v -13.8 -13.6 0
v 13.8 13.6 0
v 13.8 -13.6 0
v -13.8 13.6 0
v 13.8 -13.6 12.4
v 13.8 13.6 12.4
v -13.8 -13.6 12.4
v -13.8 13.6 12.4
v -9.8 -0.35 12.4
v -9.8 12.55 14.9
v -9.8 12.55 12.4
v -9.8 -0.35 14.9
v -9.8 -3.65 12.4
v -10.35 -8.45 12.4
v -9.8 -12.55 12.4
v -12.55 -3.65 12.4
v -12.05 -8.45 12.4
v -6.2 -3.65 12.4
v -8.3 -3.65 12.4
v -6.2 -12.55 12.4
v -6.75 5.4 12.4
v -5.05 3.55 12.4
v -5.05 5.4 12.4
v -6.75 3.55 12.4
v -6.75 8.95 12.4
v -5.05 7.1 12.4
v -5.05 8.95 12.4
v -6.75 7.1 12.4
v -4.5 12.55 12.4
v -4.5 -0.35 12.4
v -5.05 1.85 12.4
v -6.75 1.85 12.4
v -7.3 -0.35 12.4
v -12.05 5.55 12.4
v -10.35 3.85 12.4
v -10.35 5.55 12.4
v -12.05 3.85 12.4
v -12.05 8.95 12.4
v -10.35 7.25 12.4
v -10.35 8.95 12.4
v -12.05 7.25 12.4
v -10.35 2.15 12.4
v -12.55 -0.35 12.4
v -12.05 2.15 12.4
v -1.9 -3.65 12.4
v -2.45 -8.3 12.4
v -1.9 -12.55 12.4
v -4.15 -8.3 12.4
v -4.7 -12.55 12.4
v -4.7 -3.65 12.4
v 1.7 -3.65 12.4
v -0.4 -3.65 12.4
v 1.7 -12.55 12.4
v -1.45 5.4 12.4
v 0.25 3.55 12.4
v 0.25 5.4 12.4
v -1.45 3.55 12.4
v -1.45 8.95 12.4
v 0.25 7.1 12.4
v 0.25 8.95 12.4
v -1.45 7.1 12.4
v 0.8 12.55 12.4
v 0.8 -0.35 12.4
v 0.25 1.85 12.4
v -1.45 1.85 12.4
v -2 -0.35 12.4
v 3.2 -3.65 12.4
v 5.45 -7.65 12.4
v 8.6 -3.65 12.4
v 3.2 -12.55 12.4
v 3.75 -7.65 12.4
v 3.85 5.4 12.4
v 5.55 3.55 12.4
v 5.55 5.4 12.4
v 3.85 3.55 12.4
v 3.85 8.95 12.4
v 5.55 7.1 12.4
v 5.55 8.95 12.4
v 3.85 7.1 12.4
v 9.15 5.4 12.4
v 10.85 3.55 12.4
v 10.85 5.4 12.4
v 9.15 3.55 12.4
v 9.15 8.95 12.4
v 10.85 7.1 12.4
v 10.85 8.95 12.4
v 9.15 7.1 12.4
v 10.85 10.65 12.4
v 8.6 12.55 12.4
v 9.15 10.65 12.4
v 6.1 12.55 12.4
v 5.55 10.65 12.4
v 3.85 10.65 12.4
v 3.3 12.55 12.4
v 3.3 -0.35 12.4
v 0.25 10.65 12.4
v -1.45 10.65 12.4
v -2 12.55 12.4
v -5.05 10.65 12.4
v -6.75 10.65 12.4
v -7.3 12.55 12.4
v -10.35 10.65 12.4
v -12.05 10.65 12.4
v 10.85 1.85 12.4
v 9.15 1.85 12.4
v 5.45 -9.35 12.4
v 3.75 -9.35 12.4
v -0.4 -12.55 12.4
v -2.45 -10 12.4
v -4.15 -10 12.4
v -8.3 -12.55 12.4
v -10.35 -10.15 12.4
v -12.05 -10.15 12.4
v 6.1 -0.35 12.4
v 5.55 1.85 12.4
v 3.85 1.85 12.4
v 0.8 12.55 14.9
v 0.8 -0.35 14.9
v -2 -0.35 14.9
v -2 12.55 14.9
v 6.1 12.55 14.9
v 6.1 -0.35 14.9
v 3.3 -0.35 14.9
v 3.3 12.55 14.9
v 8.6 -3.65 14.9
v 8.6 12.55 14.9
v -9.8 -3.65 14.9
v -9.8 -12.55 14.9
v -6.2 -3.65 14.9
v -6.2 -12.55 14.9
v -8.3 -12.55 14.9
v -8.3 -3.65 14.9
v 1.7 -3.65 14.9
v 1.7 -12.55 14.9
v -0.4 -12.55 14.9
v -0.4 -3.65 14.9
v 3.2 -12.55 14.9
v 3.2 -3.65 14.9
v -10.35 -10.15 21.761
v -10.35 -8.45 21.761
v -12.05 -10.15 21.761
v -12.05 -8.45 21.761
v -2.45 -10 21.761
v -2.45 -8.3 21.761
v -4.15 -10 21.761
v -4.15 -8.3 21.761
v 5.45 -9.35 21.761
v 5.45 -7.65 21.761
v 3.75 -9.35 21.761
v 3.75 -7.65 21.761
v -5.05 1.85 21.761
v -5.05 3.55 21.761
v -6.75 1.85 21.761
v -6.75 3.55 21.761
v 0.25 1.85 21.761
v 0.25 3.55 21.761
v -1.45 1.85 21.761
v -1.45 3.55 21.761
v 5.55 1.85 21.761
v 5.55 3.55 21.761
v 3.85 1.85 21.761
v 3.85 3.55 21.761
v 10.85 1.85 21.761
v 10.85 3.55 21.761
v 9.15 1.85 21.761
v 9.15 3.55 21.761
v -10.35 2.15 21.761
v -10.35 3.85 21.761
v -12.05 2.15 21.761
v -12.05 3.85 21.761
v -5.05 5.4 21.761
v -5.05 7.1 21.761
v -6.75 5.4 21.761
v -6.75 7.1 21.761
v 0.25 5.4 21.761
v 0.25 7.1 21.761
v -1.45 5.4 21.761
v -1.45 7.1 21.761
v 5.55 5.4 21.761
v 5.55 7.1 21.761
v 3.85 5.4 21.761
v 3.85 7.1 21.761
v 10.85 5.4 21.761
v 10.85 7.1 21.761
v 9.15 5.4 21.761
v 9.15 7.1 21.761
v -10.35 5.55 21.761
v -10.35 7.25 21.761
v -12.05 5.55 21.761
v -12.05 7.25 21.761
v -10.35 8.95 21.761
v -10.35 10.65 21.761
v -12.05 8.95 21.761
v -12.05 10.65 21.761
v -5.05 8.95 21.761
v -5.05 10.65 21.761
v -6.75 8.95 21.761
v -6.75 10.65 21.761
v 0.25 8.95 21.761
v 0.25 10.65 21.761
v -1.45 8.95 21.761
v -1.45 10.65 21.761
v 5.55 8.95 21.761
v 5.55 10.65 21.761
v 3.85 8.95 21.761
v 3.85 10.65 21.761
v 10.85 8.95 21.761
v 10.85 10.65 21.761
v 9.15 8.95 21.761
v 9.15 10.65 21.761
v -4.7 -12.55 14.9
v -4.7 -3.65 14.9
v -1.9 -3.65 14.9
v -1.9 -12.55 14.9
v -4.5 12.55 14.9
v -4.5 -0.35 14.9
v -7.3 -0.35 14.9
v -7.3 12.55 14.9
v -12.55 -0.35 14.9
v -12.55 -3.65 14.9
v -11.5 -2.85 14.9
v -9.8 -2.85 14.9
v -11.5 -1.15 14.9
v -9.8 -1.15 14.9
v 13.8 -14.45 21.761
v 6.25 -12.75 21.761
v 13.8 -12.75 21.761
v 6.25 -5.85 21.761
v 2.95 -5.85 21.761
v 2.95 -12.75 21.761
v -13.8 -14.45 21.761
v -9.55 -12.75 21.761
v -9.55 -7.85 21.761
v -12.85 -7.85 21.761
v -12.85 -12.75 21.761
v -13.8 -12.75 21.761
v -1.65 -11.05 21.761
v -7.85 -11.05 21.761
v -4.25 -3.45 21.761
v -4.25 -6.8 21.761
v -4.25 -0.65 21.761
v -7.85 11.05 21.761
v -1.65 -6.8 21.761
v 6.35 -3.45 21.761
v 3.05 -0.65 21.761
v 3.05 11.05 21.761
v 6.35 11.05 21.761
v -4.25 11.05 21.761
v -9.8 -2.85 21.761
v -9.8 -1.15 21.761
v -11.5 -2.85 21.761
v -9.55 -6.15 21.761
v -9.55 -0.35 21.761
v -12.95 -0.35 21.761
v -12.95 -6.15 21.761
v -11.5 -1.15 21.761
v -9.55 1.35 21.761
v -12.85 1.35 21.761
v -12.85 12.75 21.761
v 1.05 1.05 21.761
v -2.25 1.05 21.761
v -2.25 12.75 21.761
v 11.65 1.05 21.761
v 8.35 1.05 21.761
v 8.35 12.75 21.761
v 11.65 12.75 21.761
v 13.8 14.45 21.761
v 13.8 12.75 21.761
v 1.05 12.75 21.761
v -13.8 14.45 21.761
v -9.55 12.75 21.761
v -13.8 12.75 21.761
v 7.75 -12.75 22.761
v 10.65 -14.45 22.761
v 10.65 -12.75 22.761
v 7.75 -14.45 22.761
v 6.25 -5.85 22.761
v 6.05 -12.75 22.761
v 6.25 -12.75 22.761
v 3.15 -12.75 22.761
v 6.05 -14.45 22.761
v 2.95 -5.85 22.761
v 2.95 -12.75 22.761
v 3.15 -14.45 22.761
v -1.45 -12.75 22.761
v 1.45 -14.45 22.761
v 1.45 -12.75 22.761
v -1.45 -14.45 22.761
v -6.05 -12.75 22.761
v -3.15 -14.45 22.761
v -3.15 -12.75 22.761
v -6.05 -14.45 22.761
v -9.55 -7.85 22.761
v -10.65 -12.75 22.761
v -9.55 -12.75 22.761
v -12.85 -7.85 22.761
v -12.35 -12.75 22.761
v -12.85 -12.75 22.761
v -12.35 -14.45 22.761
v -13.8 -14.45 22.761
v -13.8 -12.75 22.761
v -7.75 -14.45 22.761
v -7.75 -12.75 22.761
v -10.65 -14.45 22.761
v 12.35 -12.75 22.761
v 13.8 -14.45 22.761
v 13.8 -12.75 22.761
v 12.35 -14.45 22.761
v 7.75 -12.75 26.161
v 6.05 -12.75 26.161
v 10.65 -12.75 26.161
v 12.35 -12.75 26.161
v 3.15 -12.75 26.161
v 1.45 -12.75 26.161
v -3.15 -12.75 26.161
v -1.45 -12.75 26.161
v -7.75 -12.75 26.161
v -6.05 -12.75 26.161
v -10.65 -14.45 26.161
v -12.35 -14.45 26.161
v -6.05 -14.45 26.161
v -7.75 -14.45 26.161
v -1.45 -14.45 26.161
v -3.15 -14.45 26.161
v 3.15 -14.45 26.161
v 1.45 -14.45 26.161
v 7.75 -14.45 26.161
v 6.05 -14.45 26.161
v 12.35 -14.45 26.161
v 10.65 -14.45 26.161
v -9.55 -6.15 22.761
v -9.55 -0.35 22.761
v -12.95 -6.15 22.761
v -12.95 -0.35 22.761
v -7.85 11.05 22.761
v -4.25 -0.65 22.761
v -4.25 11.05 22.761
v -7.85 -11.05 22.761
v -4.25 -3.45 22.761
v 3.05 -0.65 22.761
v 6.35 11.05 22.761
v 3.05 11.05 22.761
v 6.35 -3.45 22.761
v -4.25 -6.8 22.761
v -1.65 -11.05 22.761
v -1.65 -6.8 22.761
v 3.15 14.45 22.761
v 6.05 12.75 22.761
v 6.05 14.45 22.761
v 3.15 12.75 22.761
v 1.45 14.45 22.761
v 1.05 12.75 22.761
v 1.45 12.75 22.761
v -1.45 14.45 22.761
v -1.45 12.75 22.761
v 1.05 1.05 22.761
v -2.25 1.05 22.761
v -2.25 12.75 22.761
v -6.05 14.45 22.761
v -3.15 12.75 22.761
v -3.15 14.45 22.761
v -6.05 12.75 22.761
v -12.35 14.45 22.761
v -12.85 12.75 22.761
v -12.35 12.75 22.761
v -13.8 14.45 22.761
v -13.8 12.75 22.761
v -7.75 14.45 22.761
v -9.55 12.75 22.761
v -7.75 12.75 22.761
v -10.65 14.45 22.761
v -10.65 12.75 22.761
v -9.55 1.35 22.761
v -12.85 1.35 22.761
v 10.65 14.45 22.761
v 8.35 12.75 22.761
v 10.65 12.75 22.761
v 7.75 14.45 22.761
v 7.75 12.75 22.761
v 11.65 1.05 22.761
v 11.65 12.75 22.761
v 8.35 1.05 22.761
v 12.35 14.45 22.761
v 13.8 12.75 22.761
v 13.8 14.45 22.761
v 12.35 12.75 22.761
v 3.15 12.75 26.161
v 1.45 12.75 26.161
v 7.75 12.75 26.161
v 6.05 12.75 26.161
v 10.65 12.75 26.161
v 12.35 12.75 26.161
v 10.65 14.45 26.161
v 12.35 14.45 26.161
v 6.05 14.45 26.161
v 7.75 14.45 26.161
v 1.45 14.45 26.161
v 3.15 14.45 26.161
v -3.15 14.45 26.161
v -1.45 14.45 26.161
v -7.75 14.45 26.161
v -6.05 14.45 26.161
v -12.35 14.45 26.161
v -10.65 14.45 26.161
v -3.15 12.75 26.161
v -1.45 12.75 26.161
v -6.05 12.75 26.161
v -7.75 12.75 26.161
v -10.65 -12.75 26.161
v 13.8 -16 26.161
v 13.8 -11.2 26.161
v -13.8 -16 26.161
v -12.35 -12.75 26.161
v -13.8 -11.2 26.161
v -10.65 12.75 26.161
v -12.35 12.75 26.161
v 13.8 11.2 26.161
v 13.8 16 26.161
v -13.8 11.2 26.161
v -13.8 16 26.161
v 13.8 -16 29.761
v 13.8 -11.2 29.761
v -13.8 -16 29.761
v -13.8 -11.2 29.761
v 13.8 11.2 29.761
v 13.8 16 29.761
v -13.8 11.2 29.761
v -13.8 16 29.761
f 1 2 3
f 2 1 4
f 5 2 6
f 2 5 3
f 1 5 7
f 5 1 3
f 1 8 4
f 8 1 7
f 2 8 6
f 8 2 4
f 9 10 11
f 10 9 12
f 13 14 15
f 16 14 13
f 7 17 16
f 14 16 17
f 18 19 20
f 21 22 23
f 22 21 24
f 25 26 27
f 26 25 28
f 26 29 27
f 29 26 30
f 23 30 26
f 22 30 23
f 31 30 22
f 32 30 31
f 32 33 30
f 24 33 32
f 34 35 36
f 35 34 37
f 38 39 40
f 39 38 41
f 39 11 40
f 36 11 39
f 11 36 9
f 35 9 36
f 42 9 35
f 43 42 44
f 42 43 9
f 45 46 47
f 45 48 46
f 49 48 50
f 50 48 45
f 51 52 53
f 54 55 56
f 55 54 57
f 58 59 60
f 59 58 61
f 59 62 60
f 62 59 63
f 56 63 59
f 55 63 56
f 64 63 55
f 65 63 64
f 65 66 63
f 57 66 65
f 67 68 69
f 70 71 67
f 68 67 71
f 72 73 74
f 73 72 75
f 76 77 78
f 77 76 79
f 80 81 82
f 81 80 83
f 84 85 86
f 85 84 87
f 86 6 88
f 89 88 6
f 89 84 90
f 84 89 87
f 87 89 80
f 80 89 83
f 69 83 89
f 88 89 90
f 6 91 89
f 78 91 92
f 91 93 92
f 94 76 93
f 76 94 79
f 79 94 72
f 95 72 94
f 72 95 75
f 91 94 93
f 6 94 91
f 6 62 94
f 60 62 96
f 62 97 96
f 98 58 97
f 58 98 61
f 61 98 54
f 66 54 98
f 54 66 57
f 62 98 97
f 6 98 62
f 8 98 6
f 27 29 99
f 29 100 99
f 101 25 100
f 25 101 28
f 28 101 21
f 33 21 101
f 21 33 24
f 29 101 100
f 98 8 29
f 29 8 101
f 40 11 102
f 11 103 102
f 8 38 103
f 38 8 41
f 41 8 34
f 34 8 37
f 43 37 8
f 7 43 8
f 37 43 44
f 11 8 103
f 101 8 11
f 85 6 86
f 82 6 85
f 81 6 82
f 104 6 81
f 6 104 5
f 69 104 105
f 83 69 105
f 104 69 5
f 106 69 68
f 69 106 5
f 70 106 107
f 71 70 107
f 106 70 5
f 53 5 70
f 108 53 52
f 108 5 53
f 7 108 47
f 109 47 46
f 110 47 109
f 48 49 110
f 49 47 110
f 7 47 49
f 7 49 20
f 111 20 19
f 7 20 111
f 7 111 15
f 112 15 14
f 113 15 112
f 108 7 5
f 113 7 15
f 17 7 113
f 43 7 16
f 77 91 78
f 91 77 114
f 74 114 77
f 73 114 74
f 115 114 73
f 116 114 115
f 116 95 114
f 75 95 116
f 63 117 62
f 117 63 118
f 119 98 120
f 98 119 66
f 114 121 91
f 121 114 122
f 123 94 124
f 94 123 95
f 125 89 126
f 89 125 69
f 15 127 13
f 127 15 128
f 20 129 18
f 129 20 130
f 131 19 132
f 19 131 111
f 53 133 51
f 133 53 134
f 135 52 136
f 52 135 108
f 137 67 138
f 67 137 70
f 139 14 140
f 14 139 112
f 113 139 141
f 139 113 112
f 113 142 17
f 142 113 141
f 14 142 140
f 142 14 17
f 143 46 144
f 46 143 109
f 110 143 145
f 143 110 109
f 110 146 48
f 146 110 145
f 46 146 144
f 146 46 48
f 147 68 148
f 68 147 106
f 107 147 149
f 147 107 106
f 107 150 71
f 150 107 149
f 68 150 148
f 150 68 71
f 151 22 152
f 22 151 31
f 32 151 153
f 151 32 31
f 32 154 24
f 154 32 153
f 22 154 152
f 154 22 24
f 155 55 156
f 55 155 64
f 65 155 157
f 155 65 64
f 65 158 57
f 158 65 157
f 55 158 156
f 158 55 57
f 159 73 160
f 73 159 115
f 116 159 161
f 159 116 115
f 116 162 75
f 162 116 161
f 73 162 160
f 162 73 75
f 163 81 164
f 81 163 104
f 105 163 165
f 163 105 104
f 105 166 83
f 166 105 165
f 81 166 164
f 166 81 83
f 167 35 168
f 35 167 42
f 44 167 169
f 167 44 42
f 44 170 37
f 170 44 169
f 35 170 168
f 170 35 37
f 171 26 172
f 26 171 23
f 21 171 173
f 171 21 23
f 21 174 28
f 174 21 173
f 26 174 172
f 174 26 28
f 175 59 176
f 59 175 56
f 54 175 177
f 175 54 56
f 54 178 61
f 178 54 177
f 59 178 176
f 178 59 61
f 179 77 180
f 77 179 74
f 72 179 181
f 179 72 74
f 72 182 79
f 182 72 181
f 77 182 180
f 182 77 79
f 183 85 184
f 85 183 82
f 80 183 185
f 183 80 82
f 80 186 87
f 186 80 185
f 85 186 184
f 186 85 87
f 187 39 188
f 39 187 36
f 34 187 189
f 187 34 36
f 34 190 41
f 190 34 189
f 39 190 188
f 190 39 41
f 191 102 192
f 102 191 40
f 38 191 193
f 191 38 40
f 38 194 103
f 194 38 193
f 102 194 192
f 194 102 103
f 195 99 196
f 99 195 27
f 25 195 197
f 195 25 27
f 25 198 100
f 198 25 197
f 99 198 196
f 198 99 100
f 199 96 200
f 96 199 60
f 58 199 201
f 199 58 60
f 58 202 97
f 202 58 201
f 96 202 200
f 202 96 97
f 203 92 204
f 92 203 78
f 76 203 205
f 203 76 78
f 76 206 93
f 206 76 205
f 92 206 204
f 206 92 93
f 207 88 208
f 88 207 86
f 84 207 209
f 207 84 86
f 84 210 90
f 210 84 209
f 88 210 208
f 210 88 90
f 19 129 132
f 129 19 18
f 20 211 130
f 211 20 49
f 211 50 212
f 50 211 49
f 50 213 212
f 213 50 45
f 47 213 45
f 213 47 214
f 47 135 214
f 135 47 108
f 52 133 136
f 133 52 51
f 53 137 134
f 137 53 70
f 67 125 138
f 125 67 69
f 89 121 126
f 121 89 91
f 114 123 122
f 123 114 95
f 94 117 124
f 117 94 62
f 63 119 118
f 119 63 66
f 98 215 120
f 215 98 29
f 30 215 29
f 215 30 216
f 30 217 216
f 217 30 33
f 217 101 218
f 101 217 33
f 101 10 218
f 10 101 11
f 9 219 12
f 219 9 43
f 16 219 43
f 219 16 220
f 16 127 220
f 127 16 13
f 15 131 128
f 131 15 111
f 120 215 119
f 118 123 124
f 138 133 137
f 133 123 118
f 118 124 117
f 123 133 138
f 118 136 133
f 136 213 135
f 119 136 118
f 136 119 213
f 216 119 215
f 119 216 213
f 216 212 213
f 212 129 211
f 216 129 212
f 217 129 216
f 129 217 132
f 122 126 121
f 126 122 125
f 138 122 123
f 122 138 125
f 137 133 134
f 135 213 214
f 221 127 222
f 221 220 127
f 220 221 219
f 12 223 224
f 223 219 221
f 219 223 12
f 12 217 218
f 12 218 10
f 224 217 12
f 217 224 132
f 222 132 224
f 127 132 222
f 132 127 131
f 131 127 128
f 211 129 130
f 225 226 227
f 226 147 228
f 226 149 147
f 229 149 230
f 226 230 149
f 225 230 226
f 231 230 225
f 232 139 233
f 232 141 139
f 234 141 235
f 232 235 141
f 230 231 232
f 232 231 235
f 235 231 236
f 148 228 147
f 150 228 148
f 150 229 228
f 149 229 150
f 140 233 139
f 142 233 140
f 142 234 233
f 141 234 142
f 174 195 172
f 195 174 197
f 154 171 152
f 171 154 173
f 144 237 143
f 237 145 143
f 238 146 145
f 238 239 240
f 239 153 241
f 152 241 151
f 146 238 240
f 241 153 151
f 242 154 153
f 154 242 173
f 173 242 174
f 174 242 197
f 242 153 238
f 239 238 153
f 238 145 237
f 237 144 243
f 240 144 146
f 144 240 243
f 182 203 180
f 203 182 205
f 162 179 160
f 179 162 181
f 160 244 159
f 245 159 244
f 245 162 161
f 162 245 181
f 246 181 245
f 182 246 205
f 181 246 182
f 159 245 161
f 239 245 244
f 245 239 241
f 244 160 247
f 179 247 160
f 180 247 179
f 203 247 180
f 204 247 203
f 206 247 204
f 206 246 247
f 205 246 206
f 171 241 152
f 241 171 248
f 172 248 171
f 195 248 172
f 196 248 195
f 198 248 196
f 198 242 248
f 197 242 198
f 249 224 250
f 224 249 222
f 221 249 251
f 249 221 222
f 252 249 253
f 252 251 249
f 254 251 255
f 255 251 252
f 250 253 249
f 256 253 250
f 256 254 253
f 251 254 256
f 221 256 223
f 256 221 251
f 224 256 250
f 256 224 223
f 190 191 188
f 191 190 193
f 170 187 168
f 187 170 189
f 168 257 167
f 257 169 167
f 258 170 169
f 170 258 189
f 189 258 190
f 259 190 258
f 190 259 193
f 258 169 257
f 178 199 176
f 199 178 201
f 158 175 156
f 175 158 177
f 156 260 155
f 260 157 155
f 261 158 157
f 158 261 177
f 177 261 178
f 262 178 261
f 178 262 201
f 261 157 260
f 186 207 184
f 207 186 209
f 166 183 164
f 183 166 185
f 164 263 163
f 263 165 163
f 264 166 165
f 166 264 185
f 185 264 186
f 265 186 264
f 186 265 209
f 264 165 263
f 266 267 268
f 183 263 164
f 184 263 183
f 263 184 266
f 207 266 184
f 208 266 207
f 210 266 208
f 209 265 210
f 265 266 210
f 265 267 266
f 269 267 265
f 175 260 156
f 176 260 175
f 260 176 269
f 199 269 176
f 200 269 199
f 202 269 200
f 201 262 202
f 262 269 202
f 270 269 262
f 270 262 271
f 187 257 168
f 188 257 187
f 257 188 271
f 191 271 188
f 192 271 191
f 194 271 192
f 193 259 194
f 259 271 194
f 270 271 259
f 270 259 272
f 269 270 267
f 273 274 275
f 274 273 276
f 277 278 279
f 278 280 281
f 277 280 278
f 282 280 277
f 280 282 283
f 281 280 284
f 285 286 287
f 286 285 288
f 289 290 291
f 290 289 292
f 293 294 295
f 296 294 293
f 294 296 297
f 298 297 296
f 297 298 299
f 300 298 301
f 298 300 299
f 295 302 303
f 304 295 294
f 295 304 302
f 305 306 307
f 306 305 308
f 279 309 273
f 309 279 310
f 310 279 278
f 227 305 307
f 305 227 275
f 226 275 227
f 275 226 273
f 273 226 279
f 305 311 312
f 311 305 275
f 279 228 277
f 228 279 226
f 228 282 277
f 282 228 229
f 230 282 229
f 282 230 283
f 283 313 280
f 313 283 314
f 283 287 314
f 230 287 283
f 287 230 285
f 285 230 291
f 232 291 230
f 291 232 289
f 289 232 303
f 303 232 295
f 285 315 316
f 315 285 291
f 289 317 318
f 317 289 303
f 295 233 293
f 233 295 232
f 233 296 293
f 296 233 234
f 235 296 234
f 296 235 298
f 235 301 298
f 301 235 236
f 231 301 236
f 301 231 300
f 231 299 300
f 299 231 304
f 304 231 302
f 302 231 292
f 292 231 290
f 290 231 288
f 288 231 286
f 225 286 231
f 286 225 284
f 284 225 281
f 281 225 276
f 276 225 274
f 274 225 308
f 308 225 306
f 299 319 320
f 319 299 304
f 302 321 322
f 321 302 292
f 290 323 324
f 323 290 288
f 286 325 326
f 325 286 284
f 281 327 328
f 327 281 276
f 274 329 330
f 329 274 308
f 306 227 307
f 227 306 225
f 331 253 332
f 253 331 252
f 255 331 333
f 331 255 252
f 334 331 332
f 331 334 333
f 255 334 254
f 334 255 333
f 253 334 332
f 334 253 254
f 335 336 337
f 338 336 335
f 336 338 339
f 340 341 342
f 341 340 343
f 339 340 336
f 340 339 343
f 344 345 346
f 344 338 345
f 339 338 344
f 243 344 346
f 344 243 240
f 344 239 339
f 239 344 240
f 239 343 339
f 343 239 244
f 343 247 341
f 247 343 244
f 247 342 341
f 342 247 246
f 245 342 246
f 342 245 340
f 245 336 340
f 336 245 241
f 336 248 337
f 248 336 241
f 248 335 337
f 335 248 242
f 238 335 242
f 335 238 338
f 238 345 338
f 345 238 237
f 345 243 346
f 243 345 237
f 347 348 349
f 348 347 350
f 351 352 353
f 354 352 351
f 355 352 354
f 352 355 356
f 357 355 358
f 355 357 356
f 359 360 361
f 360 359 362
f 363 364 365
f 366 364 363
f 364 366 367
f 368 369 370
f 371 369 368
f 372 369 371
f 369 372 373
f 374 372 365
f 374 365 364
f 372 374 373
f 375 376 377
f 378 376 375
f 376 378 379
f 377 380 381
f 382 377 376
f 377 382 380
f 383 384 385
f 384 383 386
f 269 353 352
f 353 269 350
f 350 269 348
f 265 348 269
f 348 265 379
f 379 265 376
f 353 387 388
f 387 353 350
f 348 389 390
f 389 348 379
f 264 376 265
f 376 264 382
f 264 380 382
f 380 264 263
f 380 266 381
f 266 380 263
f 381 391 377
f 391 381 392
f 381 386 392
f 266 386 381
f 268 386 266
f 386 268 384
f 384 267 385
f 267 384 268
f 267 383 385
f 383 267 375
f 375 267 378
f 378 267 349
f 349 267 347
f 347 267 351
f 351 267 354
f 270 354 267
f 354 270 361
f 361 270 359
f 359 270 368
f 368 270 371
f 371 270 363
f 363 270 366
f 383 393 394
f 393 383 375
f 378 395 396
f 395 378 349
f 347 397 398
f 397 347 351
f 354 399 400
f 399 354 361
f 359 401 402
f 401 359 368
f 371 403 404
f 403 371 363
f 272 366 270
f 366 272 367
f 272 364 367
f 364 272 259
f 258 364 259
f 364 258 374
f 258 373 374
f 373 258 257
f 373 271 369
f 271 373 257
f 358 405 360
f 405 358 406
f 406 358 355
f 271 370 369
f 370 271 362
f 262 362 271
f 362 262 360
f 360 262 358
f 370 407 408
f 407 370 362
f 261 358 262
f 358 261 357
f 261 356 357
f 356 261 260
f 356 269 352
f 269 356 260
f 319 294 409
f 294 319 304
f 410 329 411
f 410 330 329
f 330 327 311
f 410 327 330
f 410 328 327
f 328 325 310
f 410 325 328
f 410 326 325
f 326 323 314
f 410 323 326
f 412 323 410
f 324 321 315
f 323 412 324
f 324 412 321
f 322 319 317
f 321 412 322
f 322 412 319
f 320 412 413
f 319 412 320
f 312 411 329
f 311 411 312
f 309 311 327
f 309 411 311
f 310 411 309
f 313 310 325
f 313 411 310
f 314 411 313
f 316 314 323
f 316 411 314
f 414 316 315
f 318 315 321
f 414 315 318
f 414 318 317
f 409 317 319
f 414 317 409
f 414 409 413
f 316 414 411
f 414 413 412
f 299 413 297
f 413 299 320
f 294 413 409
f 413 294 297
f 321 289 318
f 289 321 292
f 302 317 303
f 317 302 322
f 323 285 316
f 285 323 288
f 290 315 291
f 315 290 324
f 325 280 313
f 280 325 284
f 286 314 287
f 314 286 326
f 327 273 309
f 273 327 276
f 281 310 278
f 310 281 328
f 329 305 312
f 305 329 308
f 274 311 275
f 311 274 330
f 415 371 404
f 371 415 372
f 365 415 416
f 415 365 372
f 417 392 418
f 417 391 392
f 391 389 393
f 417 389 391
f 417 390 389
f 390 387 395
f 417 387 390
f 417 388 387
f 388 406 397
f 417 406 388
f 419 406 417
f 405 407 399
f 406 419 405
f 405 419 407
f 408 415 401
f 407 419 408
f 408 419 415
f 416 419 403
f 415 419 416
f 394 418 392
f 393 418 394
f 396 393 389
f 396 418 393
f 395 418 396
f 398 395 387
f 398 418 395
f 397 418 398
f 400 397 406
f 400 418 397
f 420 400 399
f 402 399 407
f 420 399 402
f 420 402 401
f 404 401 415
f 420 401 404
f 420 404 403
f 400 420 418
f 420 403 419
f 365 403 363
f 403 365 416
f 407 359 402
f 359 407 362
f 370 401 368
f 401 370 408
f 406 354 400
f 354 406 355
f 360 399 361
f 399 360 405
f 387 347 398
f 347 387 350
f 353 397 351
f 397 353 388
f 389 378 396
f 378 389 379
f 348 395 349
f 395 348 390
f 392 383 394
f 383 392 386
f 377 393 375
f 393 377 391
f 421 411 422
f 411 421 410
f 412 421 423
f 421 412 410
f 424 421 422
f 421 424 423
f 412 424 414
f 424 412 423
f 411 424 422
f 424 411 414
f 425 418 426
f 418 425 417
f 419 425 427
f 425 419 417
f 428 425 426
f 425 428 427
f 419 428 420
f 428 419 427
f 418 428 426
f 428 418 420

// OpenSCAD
// Generated by SolidPython 0.4.2 on 2020-09-29 23:20:22
//!OpenSCAD

scale(v = 0.0100000000) {
	translate(v = [-1380, -1360, 0]) {
		union() {
			color(c = [0.4000000000, 0.4000000000, 0.4000000000]) {
				translate(v = [0, 0, 0]) {
					linear_extrude(height = 1000.0000000000) {
						polygon(paths = [[0, 1, 2, 3]], points = [[0, 0], [0, 2720], [2760, 2720], [2760, 0]]);
					}
				}
			}
			color(c = [0.2000000000, 0.6000000000, 0.2000000000]) {
				translate(v = [0, 0, 1000.0000000000]) {
					linear_extrude(height = 120.0000000000) {
						polygon(paths = [[0, 1, 2, 3]], points = [[0, 1305], [0, 2720], [2760, 2720], [2760, 1305]]);
					}
				}
			}
			color(c = [0.4000000000, 0.4000000000, 0.4000000000]) {
				translate(v = [0, 0, 1000.0000000000]) {
					linear_extrude(height = 120.0000000000) {
						polygon(paths = [[0, 1, 2, 3]], points = [[0, 0], [0, 1305], [2760, 1305], [2760, 0]]);
					}
				}
			}
			color(c = [0.9000000000, 0.6000000000, 0.6000000000]) {
				translate(v = [0, 0, 1120.0000000000]) {
					linear_extrude(height = 120.0000000000) {
						polygon(paths = [[0, 1, 2, 3]], points = [[135, 1485], [135, 2485], [400, 2485], [400, 1485]]);
					}
				}
			}
			color(c = [0.9000000000, 0.6000000000, 0.6000000000]) {
				translate(v = [0, 0, 1120.0000000000]) {
					linear_extrude(height = 120.0000000000) {
						polygon(paths = [[0, 1, 2, 3]], points = [[650, 1485], [650, 2485], [930, 2485], [930, 1485]]);
					}
				}
			}
			color(c = [0.9000000000, 0.6000000000, 0.6000000000]) {
				translate(v = [0, 0, 1120.0000000000]) {
					linear_extrude(height = 120.0000000000) {
						polygon(paths = [[0, 1, 2, 3]], points = [[1180, 1485], [1180, 2485], [1460, 2485], [1460, 1485]]);
					}
				}
			}
			color(c = [0.9000000000, 0.6000000000, 0.6000000000]) {
				translate(v = [0, 0, 1120.0000000000]) {
					linear_extrude(height = 120.0000000000) {
						polygon(paths = [[0, 1, 2, 3]], points = [[1710, 1485], [1710, 2485], [1990, 2485], [1990, 1485]]);
					}
				}
			}
			color(c = [0.9000000000, 0.6000000000, 0.6000000000]) {
				translate(v = [0, 0, 1120.0000000000]) {
					linear_extrude(height = 120.0000000000) {
						polygon(paths = [[0, 1, 2, 3]], points = [[2240, 1485], [2240, 2485], [2505, 2485], [2505, 1485]]);
					}
				}
			}
			color(c = [0.9000000000, 0.6000000000, 0.9000000000]) {
				translate(v = [0, 0, 1120.0000000000]) {
					linear_extrude(height = 120.0000000000) {
						polygon(paths = [[0, 1, 2, 3]], points = [[135, 235], [135, 785], [400, 785], [400, 235]]);
					}
				}
			}
			color(c = [0.9000000000, 0.6000000000, 0.9000000000]) {
				translate(v = [0, 0, 1120.0000000000]) {
					linear_extrude(height = 120.0000000000) {
						polygon(paths = [[0, 1, 2, 3]], points = [[550, 235], [550, 785], [760, 785], [760, 235]]);
					}
				}
			}
			color(c = [0.9000000000, 0.6000000000, 0.9000000000]) {
				translate(v = [0, 0, 1120.0000000000]) {
					linear_extrude(height = 120.0000000000) {
						polygon(paths = [[0, 1, 2, 3]], points = [[910, 235], [910, 785], [1190, 785], [1190, 235]]);
					}
				}
			}
			color(c = [0.9000000000, 0.6000000000, 0.9000000000]) {
				translate(v = [0, 0, 1120.0000000000]) {
					linear_extrude(height = 120.0000000000) {
						polygon(paths = [[0, 1, 2, 3]], points = [[1340, 235], [1340, 785], [1550, 785], [1550, 235]]);
					}
				}
			}
			color(c = [0.9000000000, 0.6000000000, 0.9000000000]) {
				translate(v = [0, 0, 1120.0000000000]) {
					linear_extrude(height = 120.0000000000) {
						polygon(paths = [[0, 1, 2, 3]], points = [[1700, 235], [1700, 785], [1965, 785], [1965, 235]]);
					}
				}
			}
			color(c = [0.2000000000, 0.6000000000, 0.2000000000]) {
				translate(v = [0, 0, 1120.0000000000]) {
					linear_extrude(height = 120.0000000000) {
						difference() {
							polygon(paths = [[0, 1, 2, 3]], points = [[0, 1305], [0, 2720], [2760, 2720], [2760, 1305]]);
							polygon(paths = [[0, 1, 2, 3]], points = [[135, 1485], [400, 1485], [400, 2485], [135, 2485]]);
							polygon(paths = [[0, 1, 2, 3]], points = [[650, 1485], [930, 1485], [930, 2485], [650, 2485]]);
							polygon(paths = [[0, 1, 2, 3]], points = [[1180, 1485], [1460, 1485], [1460, 2485], [1180, 2485]]);
							polygon(paths = [[0, 1, 2, 3]], points = [[1710, 1485], [1990, 1485], [1990, 2485], [1710, 2485]]);
							polygon(paths = [[0, 1, 2, 3]], points = [[2240, 1485], [2505, 1485], [2505, 2485], [2240, 2485]]);
						}
					}
				}
			}
			color(c = [0.4000000000, 0.4000000000, 0.4000000000]) {
				translate(v = [0, 0, 1120.0000000000]) {
					linear_extrude(height = 120.0000000000) {
						difference() {
							polygon(paths = [[0, 1, 2, 3]], points = [[0, 0], [0, 1305], [2760, 1305], [2760, 0]]);
							polygon(paths = [[0, 1, 2, 3]], points = [[135, 235], [400, 235], [400, 785], [135, 785]]);
							polygon(paths = [[0, 1, 2, 3]], points = [[550, 235], [760, 235], [760, 785], [550, 785]]);
							polygon(paths = [[0, 1, 2, 3]], points = [[910, 235], [1190, 235], [1190, 785], [910, 785]]);
							polygon(paths = [[0, 1, 2, 3]], points = [[1340, 235], [1550, 235], [1550, 785], [1340, 785]]);
							polygon(paths = [[0, 1, 2, 3]], points = [[1700, 235], [1965, 235], [1965, 785], [1700, 785]]);
						}
					}
				}
			}
			color(c = [0.1000000000, 0.1000000000, 0.1000000000]) {
				translate(v = [0, 0, 1240.0000000000]) {
					linear_extrude(height = 70.0000000000) {
						polygon(paths = [[0, 1, 2, 3]], points = [[175, 345], [175, 515], [345, 515], [345, 345]]);
					}
				}
			}
			color(c = [0.1000000000, 0.1000000000, 0.1000000000]) {
				translate(v = [0, 0, 1240.0000000000]) {
					linear_extrude(height = 70.0000000000) {
						polygon(paths = [[0, 1, 2, 3]], points = [[965, 360], [965, 530], [1135, 530], [1135, 360]]);
					}
				}
			}
			color(c = [0.1000000000, 0.1000000000, 0.1000000000]) {
				translate(v = [0, 0, 1240.0000000000]) {
					linear_extrude(height = 70.0000000000) {
						polygon(paths = [[0, 1, 2, 3]], points = [[1755, 425], [1755, 595], [1925, 595], [1925, 425]]);
					}
				}
			}
			color(c = [0.1000000000, 0.1000000000, 0.1000000000]) {
				translate(v = [0, 0, 1240.0000000000]) {
					linear_extrude(height = 70.0000000000) {
						polygon(paths = [[0, 1, 2, 3]], points = [[705, 1545], [705, 1715], [875, 1715], [875, 1545]]);
					}
				}
			}
			color(c = [0.1000000000, 0.1000000000, 0.1000000000]) {
				translate(v = [0, 0, 1240.0000000000]) {
					linear_extrude(height = 70.0000000000) {
						polygon(paths = [[0, 1, 2, 3]], points = [[1235, 1545], [1235, 1715], [1405, 1715], [1405, 1545]]);
					}
				}
			}
			color(c = [0.1000000000, 0.1000000000, 0.1000000000]) {
				translate(v = [0, 0, 1240.0000000000]) {
					linear_extrude(height = 70.0000000000) {
						polygon(paths = [[0, 1, 2, 3]], points = [[1765, 1545], [1765, 1715], [1935, 1715], [1935, 1545]]);
					}
				}
			}
			color(c = [0.1000000000, 0.1000000000, 0.1000000000]) {
				translate(v = [0, 0, 1240.0000000000]) {
					linear_extrude(height = 70.0000000000) {
						polygon(paths = [[0, 1, 2, 3]], points = [[2295, 1545], [2295, 1715], [2465, 1715], [2465, 1545]]);
					}
				}
			}
			color(c = [0.1000000000, 0.1000000000, 0.1000000000]) {
				translate(v = [0, 0, 1240.0000000000]) {
					linear_extrude(height = 70.0000000000) {
						polygon(paths = [[0, 1, 2, 3]], points = [[175, 1575], [175, 1745], [345, 1745], [345, 1575]]);
					}
				}
			}
			color(c = [0.1000000000, 0.1000000000, 0.1000000000]) {
				translate(v = [0, 0, 1240.0000000000]) {
					linear_extrude(height = 70.0000000000) {
						polygon(paths = [[0, 1, 2, 3]], points = [[705, 1900], [705, 2070], [875, 2070], [875, 1900]]);
					}
				}
			}
			color(c = [0.1000000000, 0.1000000000, 0.1000000000]) {
				translate(v = [0, 0, 1240.0000000000]) {
					linear_extrude(height = 70.0000000000) {
						polygon(paths = [[0, 1, 2, 3]], points = [[1235, 1900], [1235, 2070], [1405, 2070], [1405, 1900]]);
					}
				}
			}
			color(c = [0.1000000000, 0.1000000000, 0.1000000000]) {
				translate(v = [0, 0, 1240.0000000000]) {
					linear_extrude(height = 70.0000000000) {
						polygon(paths = [[0, 1, 2, 3]], points = [[1765, 1900], [1765, 2070], [1935, 2070], [1935, 1900]]);
					}
				}
			}
			color(c = [0.1000000000, 0.1000000000, 0.1000000000]) {
				translate(v = [0, 0, 1240.0000000000]) {
					linear_extrude(height = 70.0000000000) {
						polygon(paths = [[0, 1, 2, 3]], points = [[2295, 1900], [2295, 2070], [2465, 2070], [2465, 1900]]);
					}
				}
			}
			color(c = [0.1000000000, 0.1000000000, 0.1000000000]) {
				translate(v = [0, 0, 1240.0000000000]) {
					linear_extrude(height = 70.0000000000) {
						polygon(paths = [[0, 1, 2, 3]], points = [[175, 1915], [175, 2085], [345, 2085], [345, 1915]]);
					}
				}
			}
			color(c = [0.1000000000, 0.1000000000, 0.1000000000]) {
				translate(v = [0, 0, 1240.0000000000]) {
					linear_extrude(height = 70.0000000000) {
						polygon(paths = [[0, 1, 2, 3]], points = [[175, 2255], [175, 2425], [345, 2425], [345, 2255]]);
					}
				}
			}
			color(c = [0.1000000000, 0.1000000000, 0.1000000000]) {
				translate(v = [0, 0, 1240.0000000000]) {
					linear_extrude(height = 70.0000000000) {
						polygon(paths = [[0, 1, 2, 3]], points = [[705, 2255], [705, 2425], [875, 2425], [875, 2255]]);
					}
				}
			}
			color(c = [0.1000000000, 0.1000000000, 0.1000000000]) {
				translate(v = [0, 0, 1240.0000000000]) {
					linear_extrude(height = 70.0000000000) {
						polygon(paths = [[0, 1, 2, 3]], points = [[1235, 2255], [1235, 2425], [1405, 2425], [1405, 2255]]);
					}
				}
			}
			color(c = [0.1000000000, 0.1000000000, 0.1000000000]) {
				translate(v = [0, 0, 1240.0000000000]) {
					linear_extrude(height = 70.0000000000) {
						polygon(paths = [[0, 1, 2, 3]], points = [[1765, 2255], [1765, 2425], [1935, 2425], [1935, 2255]]);
					}
				}
			}
			color(c = [0.1000000000, 0.1000000000, 0.1000000000]) {
				translate(v = [0, 0, 1240.0000000000]) {
					linear_extrude(height = 70.0000000000) {
						polygon(paths = [[0, 1, 2, 3]], points = [[2295, 2255], [2295, 2425], [2465, 2425], [2465, 2255]]);
					}
				}
			}
			color(c = [1.0000000000, 1.0000000000, 1.0000000000]) {
				translate(v = [0, 0, 1240.0000000000]) {
					linear_extrude(height = 70.0000000000) {
						polygon(paths = [[0, 1, 2, 3, 4, 5, 6, 7, 8, 9, 10, 11, 12, 13, 14, 15, 16, 17, 18, 19, 20, 21, 22, 23, 24, 25, 26, 27, 28, 29, 30, 31, 32, 33]], points = [[400, 105], [400, 995], [125, 995], [125, 1325], [400, 1325], [400, 2615], [650, 2615], [650, 1325], [930, 1325], [930, 2615], [1180, 2615], [1180, 1325], [1460, 1325], [1460, 2615], [1710, 2615], [1710, 1325], [1990, 1325], [1990, 2615], [2240, 2615], [2240, 995], [1700, 995], [1700, 105], [1550, 105], [1550, 995], [1340, 995], [1340, 105], [1190, 105], [1190, 995], [910, 995], [910, 105], [760, 105], [760, 995], [550, 995], [550, 105]]);
					}
				}
			}
			color(c = [0.1000000000, 0.1000000000, 0.1000000000]) {
				translate(v = [0, 0, 1310.0000000000]) {
					linear_extrude(height = 180.0000000000) {
						polygon(paths = [[0, 1, 2, 3]], points = [[175, 345], [175, 515], [345, 515], [345, 345]]);
					}
				}
			}
			color(c = [0.1000000000, 0.1000000000, 0.1000000000]) {
				translate(v = [0, 0, 1310.0000000000]) {
					linear_extrude(height = 180.0000000000) {
						polygon(paths = [[0, 1, 2, 3]], points = [[965, 360], [965, 530], [1135, 530], [1135, 360]]);
					}
				}
			}
			color(c = [0.1000000000, 0.1000000000, 0.1000000000]) {
				translate(v = [0, 0, 1310.0000000000]) {
					linear_extrude(height = 180.0000000000) {
						polygon(paths = [[0, 1, 2, 3]], points = [[1755, 425], [1755, 595], [1925, 595], [1925, 425]]);
					}
				}
			}
			color(c = [0.1000000000, 0.1000000000, 0.1000000000]) {
				translate(v = [0, 0, 1310.0000000000]) {
					linear_extrude(height = 180.0000000000) {
						polygon(paths = [[0, 1, 2, 3]], points = [[705, 1545], [705, 1715], [875, 1715], [875, 1545]]);
					}
				}
			}
			color(c = [0.1000000000, 0.1000000000, 0.1000000000]) {
				translate(v = [0, 0, 1310.0000000000]) {
					linear_extrude(height = 180.0000000000) {
						polygon(paths = [[0, 1, 2, 3]], points = [[1235, 1545], [1235, 1715], [1405, 1715], [1405, 1545]]);
					}
				}
			}
			color(c = [0.1000000000, 0.1000000000, 0.1000000000]) {
				translate(v = [0, 0, 1310.0000000000]) {
					linear_extrude(height = 180.0000000000) {
						polygon(paths = [[0, 1, 2, 3]], points = [[1765, 1545], [1765, 1715], [1935, 1715], [1935, 1545]]);
					}
				}
			}
			color(c = [0.1000000000, 0.1000000000, 0.1000000000]) {
				translate(v = [0, 0, 1310.0000000000]) {
					linear_extrude(height = 180.0000000000) {
						polygon(paths = [[0, 1, 2, 3]], points = [[2295, 1545], [2295, 1715], [2465, 1715], [2465, 1545]]);
					}
				}
			}
			color(c = [0.1000000000, 0.1000000000, 0.1000000000]) {
				translate(v = [0, 0, 1310.0000000000]) {
					linear_extrude(height = 180.0000000000) {
						polygon(paths = [[0, 1, 2, 3]], points = [[175, 1575], [175, 1745], [345, 1745], [345, 1575]]);
					}
				}
			}
			color(c = [0.1000000000, 0.1000000000, 0.1000000000]) {
				translate(v = [0, 0, 1310.0000000000]) {
					linear_extrude(height = 180.0000000000) {
						polygon(paths = [[0, 1, 2, 3]], points = [[705, 1900], [705, 2070], [875, 2070], [875, 1900]]);
					}
				}
			}
			color(c = [0.1000000000, 0.1000000000, 0.1000000000]) {
				translate(v = [0, 0, 1310.0000000000]) {
					linear_extrude(height = 180.0000000000) {
						polygon(paths = [[0, 1, 2, 3]], points = [[1235, 1900], [1235, 2070], [1405, 2070], [1405, 1900]]);
					}
				}
			}
			color(c = [0.1000000000, 0.1000000000, 0.1000000000]) {
				translate(v = [0, 0, 1310.0000000000]) {
					linear_extrude(height = 180.0000000000) {
						polygon(paths = [[0, 1, 2, 3]], points = [[1765, 1900], [1765, 2070], [1935, 2070], [1935, 1900]]);
					}
				}
			}
			color(c = [0.1000000000, 0.1000000000, 0.1000000000]) {
				translate(v = [0, 0, 1310.0000000000]) {
					linear_extrude(height = 180.0000000000) {
						polygon(paths = [[0, 1, 2, 3]], points = [[2295, 1900], [2295, 2070], [2465, 2070], [2465, 1900]]);
					}
				}
			}
			color(c = [0.1000000000, 0.1000000000, 0.1000000000]) {
				translate(v = [0, 0, 1310.0000000000]) {
					linear_extrude(height = 180.0000000000) {
						polygon(paths = [[0, 1, 2, 3]], points = [[175, 1915], [175, 2085], [345, 2085], [345, 1915]]);
					}
				}
			}
			color(c = [0.1000000000, 0.1000000000, 0.1000000000]) {
				translate(v = [0, 0, 1310.0000000000]) {
					linear_extrude(height = 180.0000000000) {
						polygon(paths = [[0, 1, 2, 3]], points = [[175, 2255], [175, 2425], [345, 2425], [345, 2255]]);
					}
				}
			}
			color(c = [0.1000000000, 0.1000000000, 0.1000000000]) {
				translate(v = [0, 0, 1310.0000000000]) {
					linear_extrude(height = 180.0000000000) {
						polygon(paths = [[0, 1, 2, 3]], points = [[705, 2255], [705, 2425], [875, 2425], [875, 2255]]);
					}
				}
			}
			color(c = [0.1000000000, 0.1000000000, 0.1000000000]) {
				translate(v = [0, 0, 1310.0000000000]) {
					linear_extrude(height = 180.0000000000) {
						polygon(paths = [[0, 1, 2, 3]], points = [[1235, 2255], [1235, 2425], [1405, 2425], [1405, 2255]]);
					}
				}
			}
			color(c = [0.1000000000, 0.1000000000, 0.1000000000]) {
				translate(v = [0, 0, 1310.0000000000]) {
					linear_extrude(height = 180.0000000000) {
						polygon(paths = [[0, 1, 2, 3]], points = [[1765, 2255], [1765, 2425], [1935, 2425], [1935, 2255]]);
					}
				}
			}
			color(c = [0.1000000000, 0.1000000000, 0.1000000000]) {
				translate(v = [0, 0, 1310.0000000000]) {
					linear_extrude(height = 180.0000000000) {
						polygon(paths = [[0, 1, 2, 3]], points = [[2295, 2255], [2295, 2425], [2465, 2425], [2465, 2255]]);
					}
				}
			}
			color(c = [0.7000000000, 0, 0]) {
				translate(v = [0, 0, 1310.0000000000]) {
					linear_extrude(height = 180.0000000000) {
						polygon(paths = [[0, 1, 2, 3, 4, 5, 6, 7, 8, 9, 10, 11, 12, 13, 14, 15, 16, 17, 18, 19, 20, 21, 22, 23, 24, 25, 26, 27, 28, 29, 30, 31, 32, 33]], points = [[400, 105], [400, 995], [125, 995], [125, 1325], [400, 1325], [400, 2615], [650, 2615], [650, 1325], [930, 1325], [930, 2615], [1180, 2615], [1180, 1325], [1460, 1325], [1460, 2615], [1710, 2615], [1710, 1325], [1990, 1325], [1990, 2615], [2240, 2615], [2240, 995], [1700, 995], [1700, 105], [1550, 105], [1550, 995], [1340, 995], [1340, 105], [1190, 105], [1190, 995], [910, 995], [910, 105], [760, 105], [760, 995], [550, 995], [550, 105]]);
					}
				}
			}
			color(c = [0.1000000000, 0.1000000000, 0.1000000000]) {
				translate(v = [0, 0, 1490.0000000000]) {
					linear_extrude(height = 686.1000000000) {
						polygon(paths = [[0, 1, 2, 3]], points = [[175, 345], [175, 515], [345, 515], [345, 345]]);
					}
				}
			}
			color(c = [0.1000000000, 0.1000000000, 0.1000000000]) {
				translate(v = [0, 0, 1490.0000000000]) {
					linear_extrude(height = 686.1000000000) {
						polygon(paths = [[0, 1, 2, 3]], points = [[965, 360], [965, 530], [1135, 530], [1135, 360]]);
					}
				}
			}
			color(c = [0.1000000000, 0.1000000000, 0.1000000000]) {
				translate(v = [0, 0, 1490.0000000000]) {
					linear_extrude(height = 686.1000000000) {
						polygon(paths = [[0, 1, 2, 3]], points = [[1755, 425], [1755, 595], [1925, 595], [1925, 425]]);
					}
				}
			}
			color(c = [0.1000000000, 0.1000000000, 0.1000000000]) {
				translate(v = [0, 0, 1490.0000000000]) {
					linear_extrude(height = 686.1000000000) {
						polygon(paths = [[0, 1, 2, 3]], points = [[230, 1075], [230, 1245], [400, 1245], [400, 1075]]);
					}
				}
			}
			color(c = [0.1000000000, 0.1000000000, 0.1000000000]) {
				translate(v = [0, 0, 1490.0000000000]) {
					linear_extrude(height = 686.1000000000) {
						polygon(paths = [[0, 1, 2, 3]], points = [[705, 1545], [705, 1715], [875, 1715], [875, 1545]]);
					}
				}
			}
			color(c = [0.1000000000, 0.1000000000, 0.1000000000]) {
				translate(v = [0, 0, 1490.0000000000]) {
					linear_extrude(height = 686.1000000000) {
						polygon(paths = [[0, 1, 2, 3]], points = [[1235, 1545], [1235, 1715], [1405, 1715], [1405, 1545]]);
					}
				}
			}
			color(c = [0.1000000000, 0.1000000000, 0.1000000000]) {
				translate(v = [0, 0, 1490.0000000000]) {
					linear_extrude(height = 686.1000000000) {
						polygon(paths = [[0, 1, 2, 3]], points = [[1765, 1545], [1765, 1715], [1935, 1715], [1935, 1545]]);
					}
				}
			}
			color(c = [0.1000000000, 0.1000000000, 0.1000000000]) {
				translate(v = [0, 0, 1490.0000000000]) {
					linear_extrude(height = 686.1000000000) {
						polygon(paths = [[0, 1, 2, 3]], points = [[2295, 1545], [2295, 1715], [2465, 1715], [2465, 1545]]);
					}
				}
			}
			color(c = [0.1000000000, 0.1000000000, 0.1000000000]) {
				translate(v = [0, 0, 1490.0000000000]) {
					linear_extrude(height = 686.1000000000) {
						polygon(paths = [[0, 1, 2, 3]], points = [[175, 1575], [175, 1745], [345, 1745], [345, 1575]]);
					}
				}
			}
			color(c = [0.1000000000, 0.1000000000, 0.1000000000]) {
				translate(v = [0, 0, 1490.0000000000]) {
					linear_extrude(height = 686.1000000000) {
						polygon(paths = [[0, 1, 2, 3]], points = [[705, 1900], [705, 2070], [875, 2070], [875, 1900]]);
					}
				}
			}
			color(c = [0.1000000000, 0.1000000000, 0.1000000000]) {
				translate(v = [0, 0, 1490.0000000000]) {
					linear_extrude(height = 686.1000000000) {
						polygon(paths = [[0, 1, 2, 3]], points = [[1235, 1900], [1235, 2070], [1405, 2070], [1405, 1900]]);
					}
				}
			}
			color(c = [0.1000000000, 0.1000000000, 0.1000000000]) {
				translate(v = [0, 0, 1490.0000000000]) {
					linear_extrude(height = 686.1000000000) {
						polygon(paths = [[0, 1, 2, 3]], points = [[1765, 1900], [1765, 2070], [1935, 2070], [1935, 1900]]);
					}
				}
			}
			color(c = [0.1000000000, 0.1000000000, 0.1000000000]) {
				translate(v = [0, 0, 1490.0000000000]) {
					linear_extrude(height = 686.1000000000) {
						polygon(paths = [[0, 1, 2, 3]], points = [[2295, 1900], [2295, 2070], [2465, 2070], [2465, 1900]]);
					}
				}
			}
			color(c = [0.1000000000, 0.1000000000, 0.1000000000]) {
				translate(v = [0, 0, 1490.0000000000]) {
					linear_extrude(height = 686.1000000000) {
						polygon(paths = [[0, 1, 2, 3]], points = [[175, 1915], [175, 2085], [345, 2085], [345, 1915]]);
					}
				}
			}
			color(c = [0.1000000000, 0.1000000000, 0.1000000000]) {
				translate(v = [0, 0, 1490.0000000000]) {
					linear_extrude(height = 686.1000000000) {
						polygon(paths = [[0, 1, 2, 3]], points = [[175, 2255], [175, 2425], [345, 2425], [345, 2255]]);
					}
				}
			}
			color(c = [0.1000000000, 0.1000000000, 0.1000000000]) {
				translate(v = [0, 0, 1490.0000000000]) {
					linear_extrude(height = 686.1000000000) {
						polygon(paths = [[0, 1, 2, 3]], points = [[705, 2255], [705, 2425], [875, 2425], [875, 2255]]);
					}
				}
			}
			color(c = [0.1000000000, 0.1000000000, 0.1000000000]) {
				translate(v = [0, 0, 1490.0000000000]) {
					linear_extrude(height = 686.1000000000) {
						polygon(paths = [[0, 1, 2, 3]], points = [[1235, 2255], [1235, 2425], [1405, 2425], [1405, 2255]]);
					}
				}
			}
			color(c = [0.1000000000, 0.1000000000, 0.1000000000]) {
				translate(v = [0, 0, 1490.0000000000]) {
					linear_extrude(height = 686.1000000000) {
						polygon(paths = [[0, 1, 2, 3]], points = [[1765, 2255], [1765, 2425], [1935, 2425], [1935, 2255]]);
					}
				}
			}
			color(c = [0.1000000000, 0.1000000000, 0.1000000000]) {
				translate(v = [0, 0, 1490.0000000000]) {
					linear_extrude(height = 686.1000000000) {
						polygon(paths = [[0, 1, 2, 3]], points = [[2295, 2255], [2295, 2425], [2465, 2425], [2465, 2255]]);
					}
				}
			}
			color(c = [0.9000000000, 0.6000000000, 0.6000000000]) {
				translate(v = [0, 0, 2176.1000000000]) {
					linear_extrude(height = 100.0000000000) {
						polygon(paths = [[0, 1, 2, 3, 4, 5, 6, 7, 8, 9, 10, 11]], points = [[0, -85], [0, 85], [95, 85], [95, 575], [425, 575], [425, 85], [1675, 85], [1675, 775], [2005, 775], [2005, 85], [2760, 85], [2760, -85]]);
					}
				}
			}
			color(c = [0.9000000000, 0.6000000000, 0.6000000000]) {
				translate(v = [0, 0, 2176.1000000000]) {
					linear_extrude(height = 100.0000000000) {
						polygon(paths = [[0, 1, 2, 3]], points = [[85, 745], [85, 1325], [425, 1325], [425, 745]]);
					}
				}
			}
			color(c = [0.9000000000, 0.6000000000, 0.6000000000]) {
				translate(v = [0, 0, 2176.1000000000]) {
					linear_extrude(height = 100.0000000000) {
						polygon(paths = [[0, 1, 2, 3, 4, 5, 6, 7, 8, 9, 10, 11]], points = [[595, 255], [595, 2465], [955, 2465], [955, 1295], [1685, 1295], [1685, 2465], [2015, 2465], [2015, 1015], [955, 1015], [955, 680], [1215, 680], [1215, 255]]);
					}
				}
			}
			color(c = [0.9000000000, 0.6000000000, 0.6000000000]) {
				translate(v = [0, 0, 2176.1000000000]) {
					linear_extrude(height = 100.0000000000) {
						polygon(paths = [[0, 1, 2, 3, 4, 5, 6, 7, 8, 9, 10, 11, 12, 13, 14, 15]], points = [[1155, 1465], [1155, 2635], [425, 2635], [425, 1495], [95, 1495], [95, 2635], [0, 2635], [0, 2805], [2760, 2805], [2760, 2635], [2545, 2635], [2545, 1465], [2215, 1465], [2215, 2635], [1485, 2635], [1485, 1465]]);
					}
				}
			}
			color(c = [0.5000000000, 0.5000000000, 0.5000000000]) {
				translate(v = [0, 0, 2276.1000000000]) {
					linear_extrude(height = 340.0000000000) {
						polygon(paths = [[0, 1, 2, 3]], points = [[145, -85], [145, 85], [315, 85], [315, -85]]);
					}
				}
			}
			color(c = [0.5000000000, 0.5000000000, 0.5000000000]) {
				translate(v = [0, 0, 2276.1000000000]) {
					linear_extrude(height = 340.0000000000) {
						polygon(paths = [[0, 1, 2, 3]], points = [[605, -85], [605, 85], [775, 85], [775, -85]]);
					}
				}
			}
			color(c = [0.5000000000, 0.5000000000, 0.5000000000]) {
				translate(v = [0, 0, 2276.1000000000]) {
					linear_extrude(height = 340.0000000000) {
						polygon(paths = [[0, 1, 2, 3]], points = [[1065, -85], [1065, 85], [1235, 85], [1235, -85]]);
					}
				}
			}
			color(c = [0.5000000000, 0.5000000000, 0.5000000000]) {
				translate(v = [0, 0, 2276.1000000000]) {
					linear_extrude(height = 340.0000000000) {
						polygon(paths = [[0, 1, 2, 3]], points = [[1525, -85], [1525, 85], [1695, 85], [1695, -85]]);
					}
				}
			}
			color(c = [0.5000000000, 0.5000000000, 0.5000000000]) {
				translate(v = [0, 0, 2276.1000000000]) {
					linear_extrude(height = 340.0000000000) {
						polygon(paths = [[0, 1, 2, 3]], points = [[1985, -85], [1985, 85], [2155, 85], [2155, -85]]);
					}
				}
			}
			color(c = [0.5000000000, 0.5000000000, 0.5000000000]) {
				translate(v = [0, 0, 2276.1000000000]) {
					linear_extrude(height = 340.0000000000) {
						polygon(paths = [[0, 1, 2, 3]], points = [[2445, -85], [2445, 85], [2615, 85], [2615, -85]]);
					}
				}
			}
			color(c = [0.5000000000, 0.5000000000, 0.5000000000]) {
				translate(v = [0, 0, 2276.1000000000]) {
					linear_extrude(height = 340.0000000000) {
						polygon(paths = [[0, 1, 2, 3]], points = [[145, 2635], [145, 2805], [315, 2805], [315, 2635]]);
					}
				}
			}
			color(c = [0.5000000000, 0.5000000000, 0.5000000000]) {
				translate(v = [0, 0, 2276.1000000000]) {
					linear_extrude(height = 340.0000000000) {
						polygon(paths = [[0, 1, 2, 3]], points = [[605, 2635], [605, 2805], [775, 2805], [775, 2635]]);
					}
				}
			}
			color(c = [0.5000000000, 0.5000000000, 0.5000000000]) {
				translate(v = [0, 0, 2276.1000000000]) {
					linear_extrude(height = 340.0000000000) {
						polygon(paths = [[0, 1, 2, 3]], points = [[1065, 2635], [1065, 2805], [1235, 2805], [1235, 2635]]);
					}
				}
			}
			color(c = [0.5000000000, 0.5000000000, 0.5000000000]) {
				translate(v = [0, 0, 2276.1000000000]) {
					linear_extrude(height = 340.0000000000) {
						polygon(paths = [[0, 1, 2, 3]], points = [[1525, 2635], [1525, 2805], [1695, 2805], [1695, 2635]]);
					}
				}
			}
			color(c = [0.5000000000, 0.5000000000, 0.5000000000]) {
				translate(v = [0, 0, 2276.1000000000]) {
					linear_extrude(height = 340.0000000000) {
						polygon(paths = [[0, 1, 2, 3]], points = [[1985, 2635], [1985, 2805], [2155, 2805], [2155, 2635]]);
					}
				}
			}
			color(c = [0.5000000000, 0.5000000000, 0.5000000000]) {
				translate(v = [0, 0, 2276.1000000000]) {
					linear_extrude(height = 340.0000000000) {
						polygon(paths = [[0, 1, 2, 3]], points = [[2445, 2635], [2445, 2805], [2615, 2805], [2615, 2635]]);
					}
				}
			}
			color(c = [0.3000000000, 0.3000000000, 1]) {
				translate(v = [0, 0, 2616.1000000000]) {
					linear_extrude(height = 360.0000000000) {
						polygon(paths = [[0, 1, 2, 3]], points = [[0, -240], [0, 240], [2760, 240], [2760, -240]]);
					}
				}
			}
			color(c = [0.3000000000, 0.3000000000, 1]) {
				translate(v = [0, 0, 2616.1000000000]) {
					linear_extrude(height = 360.0000000000) {
						polygon(paths = [[0, 1, 2, 3]], points = [[0, 2480], [0, 2960], [2760, 2960], [2760, 2480]]);
					}
				}
			}
		}
	}
}
